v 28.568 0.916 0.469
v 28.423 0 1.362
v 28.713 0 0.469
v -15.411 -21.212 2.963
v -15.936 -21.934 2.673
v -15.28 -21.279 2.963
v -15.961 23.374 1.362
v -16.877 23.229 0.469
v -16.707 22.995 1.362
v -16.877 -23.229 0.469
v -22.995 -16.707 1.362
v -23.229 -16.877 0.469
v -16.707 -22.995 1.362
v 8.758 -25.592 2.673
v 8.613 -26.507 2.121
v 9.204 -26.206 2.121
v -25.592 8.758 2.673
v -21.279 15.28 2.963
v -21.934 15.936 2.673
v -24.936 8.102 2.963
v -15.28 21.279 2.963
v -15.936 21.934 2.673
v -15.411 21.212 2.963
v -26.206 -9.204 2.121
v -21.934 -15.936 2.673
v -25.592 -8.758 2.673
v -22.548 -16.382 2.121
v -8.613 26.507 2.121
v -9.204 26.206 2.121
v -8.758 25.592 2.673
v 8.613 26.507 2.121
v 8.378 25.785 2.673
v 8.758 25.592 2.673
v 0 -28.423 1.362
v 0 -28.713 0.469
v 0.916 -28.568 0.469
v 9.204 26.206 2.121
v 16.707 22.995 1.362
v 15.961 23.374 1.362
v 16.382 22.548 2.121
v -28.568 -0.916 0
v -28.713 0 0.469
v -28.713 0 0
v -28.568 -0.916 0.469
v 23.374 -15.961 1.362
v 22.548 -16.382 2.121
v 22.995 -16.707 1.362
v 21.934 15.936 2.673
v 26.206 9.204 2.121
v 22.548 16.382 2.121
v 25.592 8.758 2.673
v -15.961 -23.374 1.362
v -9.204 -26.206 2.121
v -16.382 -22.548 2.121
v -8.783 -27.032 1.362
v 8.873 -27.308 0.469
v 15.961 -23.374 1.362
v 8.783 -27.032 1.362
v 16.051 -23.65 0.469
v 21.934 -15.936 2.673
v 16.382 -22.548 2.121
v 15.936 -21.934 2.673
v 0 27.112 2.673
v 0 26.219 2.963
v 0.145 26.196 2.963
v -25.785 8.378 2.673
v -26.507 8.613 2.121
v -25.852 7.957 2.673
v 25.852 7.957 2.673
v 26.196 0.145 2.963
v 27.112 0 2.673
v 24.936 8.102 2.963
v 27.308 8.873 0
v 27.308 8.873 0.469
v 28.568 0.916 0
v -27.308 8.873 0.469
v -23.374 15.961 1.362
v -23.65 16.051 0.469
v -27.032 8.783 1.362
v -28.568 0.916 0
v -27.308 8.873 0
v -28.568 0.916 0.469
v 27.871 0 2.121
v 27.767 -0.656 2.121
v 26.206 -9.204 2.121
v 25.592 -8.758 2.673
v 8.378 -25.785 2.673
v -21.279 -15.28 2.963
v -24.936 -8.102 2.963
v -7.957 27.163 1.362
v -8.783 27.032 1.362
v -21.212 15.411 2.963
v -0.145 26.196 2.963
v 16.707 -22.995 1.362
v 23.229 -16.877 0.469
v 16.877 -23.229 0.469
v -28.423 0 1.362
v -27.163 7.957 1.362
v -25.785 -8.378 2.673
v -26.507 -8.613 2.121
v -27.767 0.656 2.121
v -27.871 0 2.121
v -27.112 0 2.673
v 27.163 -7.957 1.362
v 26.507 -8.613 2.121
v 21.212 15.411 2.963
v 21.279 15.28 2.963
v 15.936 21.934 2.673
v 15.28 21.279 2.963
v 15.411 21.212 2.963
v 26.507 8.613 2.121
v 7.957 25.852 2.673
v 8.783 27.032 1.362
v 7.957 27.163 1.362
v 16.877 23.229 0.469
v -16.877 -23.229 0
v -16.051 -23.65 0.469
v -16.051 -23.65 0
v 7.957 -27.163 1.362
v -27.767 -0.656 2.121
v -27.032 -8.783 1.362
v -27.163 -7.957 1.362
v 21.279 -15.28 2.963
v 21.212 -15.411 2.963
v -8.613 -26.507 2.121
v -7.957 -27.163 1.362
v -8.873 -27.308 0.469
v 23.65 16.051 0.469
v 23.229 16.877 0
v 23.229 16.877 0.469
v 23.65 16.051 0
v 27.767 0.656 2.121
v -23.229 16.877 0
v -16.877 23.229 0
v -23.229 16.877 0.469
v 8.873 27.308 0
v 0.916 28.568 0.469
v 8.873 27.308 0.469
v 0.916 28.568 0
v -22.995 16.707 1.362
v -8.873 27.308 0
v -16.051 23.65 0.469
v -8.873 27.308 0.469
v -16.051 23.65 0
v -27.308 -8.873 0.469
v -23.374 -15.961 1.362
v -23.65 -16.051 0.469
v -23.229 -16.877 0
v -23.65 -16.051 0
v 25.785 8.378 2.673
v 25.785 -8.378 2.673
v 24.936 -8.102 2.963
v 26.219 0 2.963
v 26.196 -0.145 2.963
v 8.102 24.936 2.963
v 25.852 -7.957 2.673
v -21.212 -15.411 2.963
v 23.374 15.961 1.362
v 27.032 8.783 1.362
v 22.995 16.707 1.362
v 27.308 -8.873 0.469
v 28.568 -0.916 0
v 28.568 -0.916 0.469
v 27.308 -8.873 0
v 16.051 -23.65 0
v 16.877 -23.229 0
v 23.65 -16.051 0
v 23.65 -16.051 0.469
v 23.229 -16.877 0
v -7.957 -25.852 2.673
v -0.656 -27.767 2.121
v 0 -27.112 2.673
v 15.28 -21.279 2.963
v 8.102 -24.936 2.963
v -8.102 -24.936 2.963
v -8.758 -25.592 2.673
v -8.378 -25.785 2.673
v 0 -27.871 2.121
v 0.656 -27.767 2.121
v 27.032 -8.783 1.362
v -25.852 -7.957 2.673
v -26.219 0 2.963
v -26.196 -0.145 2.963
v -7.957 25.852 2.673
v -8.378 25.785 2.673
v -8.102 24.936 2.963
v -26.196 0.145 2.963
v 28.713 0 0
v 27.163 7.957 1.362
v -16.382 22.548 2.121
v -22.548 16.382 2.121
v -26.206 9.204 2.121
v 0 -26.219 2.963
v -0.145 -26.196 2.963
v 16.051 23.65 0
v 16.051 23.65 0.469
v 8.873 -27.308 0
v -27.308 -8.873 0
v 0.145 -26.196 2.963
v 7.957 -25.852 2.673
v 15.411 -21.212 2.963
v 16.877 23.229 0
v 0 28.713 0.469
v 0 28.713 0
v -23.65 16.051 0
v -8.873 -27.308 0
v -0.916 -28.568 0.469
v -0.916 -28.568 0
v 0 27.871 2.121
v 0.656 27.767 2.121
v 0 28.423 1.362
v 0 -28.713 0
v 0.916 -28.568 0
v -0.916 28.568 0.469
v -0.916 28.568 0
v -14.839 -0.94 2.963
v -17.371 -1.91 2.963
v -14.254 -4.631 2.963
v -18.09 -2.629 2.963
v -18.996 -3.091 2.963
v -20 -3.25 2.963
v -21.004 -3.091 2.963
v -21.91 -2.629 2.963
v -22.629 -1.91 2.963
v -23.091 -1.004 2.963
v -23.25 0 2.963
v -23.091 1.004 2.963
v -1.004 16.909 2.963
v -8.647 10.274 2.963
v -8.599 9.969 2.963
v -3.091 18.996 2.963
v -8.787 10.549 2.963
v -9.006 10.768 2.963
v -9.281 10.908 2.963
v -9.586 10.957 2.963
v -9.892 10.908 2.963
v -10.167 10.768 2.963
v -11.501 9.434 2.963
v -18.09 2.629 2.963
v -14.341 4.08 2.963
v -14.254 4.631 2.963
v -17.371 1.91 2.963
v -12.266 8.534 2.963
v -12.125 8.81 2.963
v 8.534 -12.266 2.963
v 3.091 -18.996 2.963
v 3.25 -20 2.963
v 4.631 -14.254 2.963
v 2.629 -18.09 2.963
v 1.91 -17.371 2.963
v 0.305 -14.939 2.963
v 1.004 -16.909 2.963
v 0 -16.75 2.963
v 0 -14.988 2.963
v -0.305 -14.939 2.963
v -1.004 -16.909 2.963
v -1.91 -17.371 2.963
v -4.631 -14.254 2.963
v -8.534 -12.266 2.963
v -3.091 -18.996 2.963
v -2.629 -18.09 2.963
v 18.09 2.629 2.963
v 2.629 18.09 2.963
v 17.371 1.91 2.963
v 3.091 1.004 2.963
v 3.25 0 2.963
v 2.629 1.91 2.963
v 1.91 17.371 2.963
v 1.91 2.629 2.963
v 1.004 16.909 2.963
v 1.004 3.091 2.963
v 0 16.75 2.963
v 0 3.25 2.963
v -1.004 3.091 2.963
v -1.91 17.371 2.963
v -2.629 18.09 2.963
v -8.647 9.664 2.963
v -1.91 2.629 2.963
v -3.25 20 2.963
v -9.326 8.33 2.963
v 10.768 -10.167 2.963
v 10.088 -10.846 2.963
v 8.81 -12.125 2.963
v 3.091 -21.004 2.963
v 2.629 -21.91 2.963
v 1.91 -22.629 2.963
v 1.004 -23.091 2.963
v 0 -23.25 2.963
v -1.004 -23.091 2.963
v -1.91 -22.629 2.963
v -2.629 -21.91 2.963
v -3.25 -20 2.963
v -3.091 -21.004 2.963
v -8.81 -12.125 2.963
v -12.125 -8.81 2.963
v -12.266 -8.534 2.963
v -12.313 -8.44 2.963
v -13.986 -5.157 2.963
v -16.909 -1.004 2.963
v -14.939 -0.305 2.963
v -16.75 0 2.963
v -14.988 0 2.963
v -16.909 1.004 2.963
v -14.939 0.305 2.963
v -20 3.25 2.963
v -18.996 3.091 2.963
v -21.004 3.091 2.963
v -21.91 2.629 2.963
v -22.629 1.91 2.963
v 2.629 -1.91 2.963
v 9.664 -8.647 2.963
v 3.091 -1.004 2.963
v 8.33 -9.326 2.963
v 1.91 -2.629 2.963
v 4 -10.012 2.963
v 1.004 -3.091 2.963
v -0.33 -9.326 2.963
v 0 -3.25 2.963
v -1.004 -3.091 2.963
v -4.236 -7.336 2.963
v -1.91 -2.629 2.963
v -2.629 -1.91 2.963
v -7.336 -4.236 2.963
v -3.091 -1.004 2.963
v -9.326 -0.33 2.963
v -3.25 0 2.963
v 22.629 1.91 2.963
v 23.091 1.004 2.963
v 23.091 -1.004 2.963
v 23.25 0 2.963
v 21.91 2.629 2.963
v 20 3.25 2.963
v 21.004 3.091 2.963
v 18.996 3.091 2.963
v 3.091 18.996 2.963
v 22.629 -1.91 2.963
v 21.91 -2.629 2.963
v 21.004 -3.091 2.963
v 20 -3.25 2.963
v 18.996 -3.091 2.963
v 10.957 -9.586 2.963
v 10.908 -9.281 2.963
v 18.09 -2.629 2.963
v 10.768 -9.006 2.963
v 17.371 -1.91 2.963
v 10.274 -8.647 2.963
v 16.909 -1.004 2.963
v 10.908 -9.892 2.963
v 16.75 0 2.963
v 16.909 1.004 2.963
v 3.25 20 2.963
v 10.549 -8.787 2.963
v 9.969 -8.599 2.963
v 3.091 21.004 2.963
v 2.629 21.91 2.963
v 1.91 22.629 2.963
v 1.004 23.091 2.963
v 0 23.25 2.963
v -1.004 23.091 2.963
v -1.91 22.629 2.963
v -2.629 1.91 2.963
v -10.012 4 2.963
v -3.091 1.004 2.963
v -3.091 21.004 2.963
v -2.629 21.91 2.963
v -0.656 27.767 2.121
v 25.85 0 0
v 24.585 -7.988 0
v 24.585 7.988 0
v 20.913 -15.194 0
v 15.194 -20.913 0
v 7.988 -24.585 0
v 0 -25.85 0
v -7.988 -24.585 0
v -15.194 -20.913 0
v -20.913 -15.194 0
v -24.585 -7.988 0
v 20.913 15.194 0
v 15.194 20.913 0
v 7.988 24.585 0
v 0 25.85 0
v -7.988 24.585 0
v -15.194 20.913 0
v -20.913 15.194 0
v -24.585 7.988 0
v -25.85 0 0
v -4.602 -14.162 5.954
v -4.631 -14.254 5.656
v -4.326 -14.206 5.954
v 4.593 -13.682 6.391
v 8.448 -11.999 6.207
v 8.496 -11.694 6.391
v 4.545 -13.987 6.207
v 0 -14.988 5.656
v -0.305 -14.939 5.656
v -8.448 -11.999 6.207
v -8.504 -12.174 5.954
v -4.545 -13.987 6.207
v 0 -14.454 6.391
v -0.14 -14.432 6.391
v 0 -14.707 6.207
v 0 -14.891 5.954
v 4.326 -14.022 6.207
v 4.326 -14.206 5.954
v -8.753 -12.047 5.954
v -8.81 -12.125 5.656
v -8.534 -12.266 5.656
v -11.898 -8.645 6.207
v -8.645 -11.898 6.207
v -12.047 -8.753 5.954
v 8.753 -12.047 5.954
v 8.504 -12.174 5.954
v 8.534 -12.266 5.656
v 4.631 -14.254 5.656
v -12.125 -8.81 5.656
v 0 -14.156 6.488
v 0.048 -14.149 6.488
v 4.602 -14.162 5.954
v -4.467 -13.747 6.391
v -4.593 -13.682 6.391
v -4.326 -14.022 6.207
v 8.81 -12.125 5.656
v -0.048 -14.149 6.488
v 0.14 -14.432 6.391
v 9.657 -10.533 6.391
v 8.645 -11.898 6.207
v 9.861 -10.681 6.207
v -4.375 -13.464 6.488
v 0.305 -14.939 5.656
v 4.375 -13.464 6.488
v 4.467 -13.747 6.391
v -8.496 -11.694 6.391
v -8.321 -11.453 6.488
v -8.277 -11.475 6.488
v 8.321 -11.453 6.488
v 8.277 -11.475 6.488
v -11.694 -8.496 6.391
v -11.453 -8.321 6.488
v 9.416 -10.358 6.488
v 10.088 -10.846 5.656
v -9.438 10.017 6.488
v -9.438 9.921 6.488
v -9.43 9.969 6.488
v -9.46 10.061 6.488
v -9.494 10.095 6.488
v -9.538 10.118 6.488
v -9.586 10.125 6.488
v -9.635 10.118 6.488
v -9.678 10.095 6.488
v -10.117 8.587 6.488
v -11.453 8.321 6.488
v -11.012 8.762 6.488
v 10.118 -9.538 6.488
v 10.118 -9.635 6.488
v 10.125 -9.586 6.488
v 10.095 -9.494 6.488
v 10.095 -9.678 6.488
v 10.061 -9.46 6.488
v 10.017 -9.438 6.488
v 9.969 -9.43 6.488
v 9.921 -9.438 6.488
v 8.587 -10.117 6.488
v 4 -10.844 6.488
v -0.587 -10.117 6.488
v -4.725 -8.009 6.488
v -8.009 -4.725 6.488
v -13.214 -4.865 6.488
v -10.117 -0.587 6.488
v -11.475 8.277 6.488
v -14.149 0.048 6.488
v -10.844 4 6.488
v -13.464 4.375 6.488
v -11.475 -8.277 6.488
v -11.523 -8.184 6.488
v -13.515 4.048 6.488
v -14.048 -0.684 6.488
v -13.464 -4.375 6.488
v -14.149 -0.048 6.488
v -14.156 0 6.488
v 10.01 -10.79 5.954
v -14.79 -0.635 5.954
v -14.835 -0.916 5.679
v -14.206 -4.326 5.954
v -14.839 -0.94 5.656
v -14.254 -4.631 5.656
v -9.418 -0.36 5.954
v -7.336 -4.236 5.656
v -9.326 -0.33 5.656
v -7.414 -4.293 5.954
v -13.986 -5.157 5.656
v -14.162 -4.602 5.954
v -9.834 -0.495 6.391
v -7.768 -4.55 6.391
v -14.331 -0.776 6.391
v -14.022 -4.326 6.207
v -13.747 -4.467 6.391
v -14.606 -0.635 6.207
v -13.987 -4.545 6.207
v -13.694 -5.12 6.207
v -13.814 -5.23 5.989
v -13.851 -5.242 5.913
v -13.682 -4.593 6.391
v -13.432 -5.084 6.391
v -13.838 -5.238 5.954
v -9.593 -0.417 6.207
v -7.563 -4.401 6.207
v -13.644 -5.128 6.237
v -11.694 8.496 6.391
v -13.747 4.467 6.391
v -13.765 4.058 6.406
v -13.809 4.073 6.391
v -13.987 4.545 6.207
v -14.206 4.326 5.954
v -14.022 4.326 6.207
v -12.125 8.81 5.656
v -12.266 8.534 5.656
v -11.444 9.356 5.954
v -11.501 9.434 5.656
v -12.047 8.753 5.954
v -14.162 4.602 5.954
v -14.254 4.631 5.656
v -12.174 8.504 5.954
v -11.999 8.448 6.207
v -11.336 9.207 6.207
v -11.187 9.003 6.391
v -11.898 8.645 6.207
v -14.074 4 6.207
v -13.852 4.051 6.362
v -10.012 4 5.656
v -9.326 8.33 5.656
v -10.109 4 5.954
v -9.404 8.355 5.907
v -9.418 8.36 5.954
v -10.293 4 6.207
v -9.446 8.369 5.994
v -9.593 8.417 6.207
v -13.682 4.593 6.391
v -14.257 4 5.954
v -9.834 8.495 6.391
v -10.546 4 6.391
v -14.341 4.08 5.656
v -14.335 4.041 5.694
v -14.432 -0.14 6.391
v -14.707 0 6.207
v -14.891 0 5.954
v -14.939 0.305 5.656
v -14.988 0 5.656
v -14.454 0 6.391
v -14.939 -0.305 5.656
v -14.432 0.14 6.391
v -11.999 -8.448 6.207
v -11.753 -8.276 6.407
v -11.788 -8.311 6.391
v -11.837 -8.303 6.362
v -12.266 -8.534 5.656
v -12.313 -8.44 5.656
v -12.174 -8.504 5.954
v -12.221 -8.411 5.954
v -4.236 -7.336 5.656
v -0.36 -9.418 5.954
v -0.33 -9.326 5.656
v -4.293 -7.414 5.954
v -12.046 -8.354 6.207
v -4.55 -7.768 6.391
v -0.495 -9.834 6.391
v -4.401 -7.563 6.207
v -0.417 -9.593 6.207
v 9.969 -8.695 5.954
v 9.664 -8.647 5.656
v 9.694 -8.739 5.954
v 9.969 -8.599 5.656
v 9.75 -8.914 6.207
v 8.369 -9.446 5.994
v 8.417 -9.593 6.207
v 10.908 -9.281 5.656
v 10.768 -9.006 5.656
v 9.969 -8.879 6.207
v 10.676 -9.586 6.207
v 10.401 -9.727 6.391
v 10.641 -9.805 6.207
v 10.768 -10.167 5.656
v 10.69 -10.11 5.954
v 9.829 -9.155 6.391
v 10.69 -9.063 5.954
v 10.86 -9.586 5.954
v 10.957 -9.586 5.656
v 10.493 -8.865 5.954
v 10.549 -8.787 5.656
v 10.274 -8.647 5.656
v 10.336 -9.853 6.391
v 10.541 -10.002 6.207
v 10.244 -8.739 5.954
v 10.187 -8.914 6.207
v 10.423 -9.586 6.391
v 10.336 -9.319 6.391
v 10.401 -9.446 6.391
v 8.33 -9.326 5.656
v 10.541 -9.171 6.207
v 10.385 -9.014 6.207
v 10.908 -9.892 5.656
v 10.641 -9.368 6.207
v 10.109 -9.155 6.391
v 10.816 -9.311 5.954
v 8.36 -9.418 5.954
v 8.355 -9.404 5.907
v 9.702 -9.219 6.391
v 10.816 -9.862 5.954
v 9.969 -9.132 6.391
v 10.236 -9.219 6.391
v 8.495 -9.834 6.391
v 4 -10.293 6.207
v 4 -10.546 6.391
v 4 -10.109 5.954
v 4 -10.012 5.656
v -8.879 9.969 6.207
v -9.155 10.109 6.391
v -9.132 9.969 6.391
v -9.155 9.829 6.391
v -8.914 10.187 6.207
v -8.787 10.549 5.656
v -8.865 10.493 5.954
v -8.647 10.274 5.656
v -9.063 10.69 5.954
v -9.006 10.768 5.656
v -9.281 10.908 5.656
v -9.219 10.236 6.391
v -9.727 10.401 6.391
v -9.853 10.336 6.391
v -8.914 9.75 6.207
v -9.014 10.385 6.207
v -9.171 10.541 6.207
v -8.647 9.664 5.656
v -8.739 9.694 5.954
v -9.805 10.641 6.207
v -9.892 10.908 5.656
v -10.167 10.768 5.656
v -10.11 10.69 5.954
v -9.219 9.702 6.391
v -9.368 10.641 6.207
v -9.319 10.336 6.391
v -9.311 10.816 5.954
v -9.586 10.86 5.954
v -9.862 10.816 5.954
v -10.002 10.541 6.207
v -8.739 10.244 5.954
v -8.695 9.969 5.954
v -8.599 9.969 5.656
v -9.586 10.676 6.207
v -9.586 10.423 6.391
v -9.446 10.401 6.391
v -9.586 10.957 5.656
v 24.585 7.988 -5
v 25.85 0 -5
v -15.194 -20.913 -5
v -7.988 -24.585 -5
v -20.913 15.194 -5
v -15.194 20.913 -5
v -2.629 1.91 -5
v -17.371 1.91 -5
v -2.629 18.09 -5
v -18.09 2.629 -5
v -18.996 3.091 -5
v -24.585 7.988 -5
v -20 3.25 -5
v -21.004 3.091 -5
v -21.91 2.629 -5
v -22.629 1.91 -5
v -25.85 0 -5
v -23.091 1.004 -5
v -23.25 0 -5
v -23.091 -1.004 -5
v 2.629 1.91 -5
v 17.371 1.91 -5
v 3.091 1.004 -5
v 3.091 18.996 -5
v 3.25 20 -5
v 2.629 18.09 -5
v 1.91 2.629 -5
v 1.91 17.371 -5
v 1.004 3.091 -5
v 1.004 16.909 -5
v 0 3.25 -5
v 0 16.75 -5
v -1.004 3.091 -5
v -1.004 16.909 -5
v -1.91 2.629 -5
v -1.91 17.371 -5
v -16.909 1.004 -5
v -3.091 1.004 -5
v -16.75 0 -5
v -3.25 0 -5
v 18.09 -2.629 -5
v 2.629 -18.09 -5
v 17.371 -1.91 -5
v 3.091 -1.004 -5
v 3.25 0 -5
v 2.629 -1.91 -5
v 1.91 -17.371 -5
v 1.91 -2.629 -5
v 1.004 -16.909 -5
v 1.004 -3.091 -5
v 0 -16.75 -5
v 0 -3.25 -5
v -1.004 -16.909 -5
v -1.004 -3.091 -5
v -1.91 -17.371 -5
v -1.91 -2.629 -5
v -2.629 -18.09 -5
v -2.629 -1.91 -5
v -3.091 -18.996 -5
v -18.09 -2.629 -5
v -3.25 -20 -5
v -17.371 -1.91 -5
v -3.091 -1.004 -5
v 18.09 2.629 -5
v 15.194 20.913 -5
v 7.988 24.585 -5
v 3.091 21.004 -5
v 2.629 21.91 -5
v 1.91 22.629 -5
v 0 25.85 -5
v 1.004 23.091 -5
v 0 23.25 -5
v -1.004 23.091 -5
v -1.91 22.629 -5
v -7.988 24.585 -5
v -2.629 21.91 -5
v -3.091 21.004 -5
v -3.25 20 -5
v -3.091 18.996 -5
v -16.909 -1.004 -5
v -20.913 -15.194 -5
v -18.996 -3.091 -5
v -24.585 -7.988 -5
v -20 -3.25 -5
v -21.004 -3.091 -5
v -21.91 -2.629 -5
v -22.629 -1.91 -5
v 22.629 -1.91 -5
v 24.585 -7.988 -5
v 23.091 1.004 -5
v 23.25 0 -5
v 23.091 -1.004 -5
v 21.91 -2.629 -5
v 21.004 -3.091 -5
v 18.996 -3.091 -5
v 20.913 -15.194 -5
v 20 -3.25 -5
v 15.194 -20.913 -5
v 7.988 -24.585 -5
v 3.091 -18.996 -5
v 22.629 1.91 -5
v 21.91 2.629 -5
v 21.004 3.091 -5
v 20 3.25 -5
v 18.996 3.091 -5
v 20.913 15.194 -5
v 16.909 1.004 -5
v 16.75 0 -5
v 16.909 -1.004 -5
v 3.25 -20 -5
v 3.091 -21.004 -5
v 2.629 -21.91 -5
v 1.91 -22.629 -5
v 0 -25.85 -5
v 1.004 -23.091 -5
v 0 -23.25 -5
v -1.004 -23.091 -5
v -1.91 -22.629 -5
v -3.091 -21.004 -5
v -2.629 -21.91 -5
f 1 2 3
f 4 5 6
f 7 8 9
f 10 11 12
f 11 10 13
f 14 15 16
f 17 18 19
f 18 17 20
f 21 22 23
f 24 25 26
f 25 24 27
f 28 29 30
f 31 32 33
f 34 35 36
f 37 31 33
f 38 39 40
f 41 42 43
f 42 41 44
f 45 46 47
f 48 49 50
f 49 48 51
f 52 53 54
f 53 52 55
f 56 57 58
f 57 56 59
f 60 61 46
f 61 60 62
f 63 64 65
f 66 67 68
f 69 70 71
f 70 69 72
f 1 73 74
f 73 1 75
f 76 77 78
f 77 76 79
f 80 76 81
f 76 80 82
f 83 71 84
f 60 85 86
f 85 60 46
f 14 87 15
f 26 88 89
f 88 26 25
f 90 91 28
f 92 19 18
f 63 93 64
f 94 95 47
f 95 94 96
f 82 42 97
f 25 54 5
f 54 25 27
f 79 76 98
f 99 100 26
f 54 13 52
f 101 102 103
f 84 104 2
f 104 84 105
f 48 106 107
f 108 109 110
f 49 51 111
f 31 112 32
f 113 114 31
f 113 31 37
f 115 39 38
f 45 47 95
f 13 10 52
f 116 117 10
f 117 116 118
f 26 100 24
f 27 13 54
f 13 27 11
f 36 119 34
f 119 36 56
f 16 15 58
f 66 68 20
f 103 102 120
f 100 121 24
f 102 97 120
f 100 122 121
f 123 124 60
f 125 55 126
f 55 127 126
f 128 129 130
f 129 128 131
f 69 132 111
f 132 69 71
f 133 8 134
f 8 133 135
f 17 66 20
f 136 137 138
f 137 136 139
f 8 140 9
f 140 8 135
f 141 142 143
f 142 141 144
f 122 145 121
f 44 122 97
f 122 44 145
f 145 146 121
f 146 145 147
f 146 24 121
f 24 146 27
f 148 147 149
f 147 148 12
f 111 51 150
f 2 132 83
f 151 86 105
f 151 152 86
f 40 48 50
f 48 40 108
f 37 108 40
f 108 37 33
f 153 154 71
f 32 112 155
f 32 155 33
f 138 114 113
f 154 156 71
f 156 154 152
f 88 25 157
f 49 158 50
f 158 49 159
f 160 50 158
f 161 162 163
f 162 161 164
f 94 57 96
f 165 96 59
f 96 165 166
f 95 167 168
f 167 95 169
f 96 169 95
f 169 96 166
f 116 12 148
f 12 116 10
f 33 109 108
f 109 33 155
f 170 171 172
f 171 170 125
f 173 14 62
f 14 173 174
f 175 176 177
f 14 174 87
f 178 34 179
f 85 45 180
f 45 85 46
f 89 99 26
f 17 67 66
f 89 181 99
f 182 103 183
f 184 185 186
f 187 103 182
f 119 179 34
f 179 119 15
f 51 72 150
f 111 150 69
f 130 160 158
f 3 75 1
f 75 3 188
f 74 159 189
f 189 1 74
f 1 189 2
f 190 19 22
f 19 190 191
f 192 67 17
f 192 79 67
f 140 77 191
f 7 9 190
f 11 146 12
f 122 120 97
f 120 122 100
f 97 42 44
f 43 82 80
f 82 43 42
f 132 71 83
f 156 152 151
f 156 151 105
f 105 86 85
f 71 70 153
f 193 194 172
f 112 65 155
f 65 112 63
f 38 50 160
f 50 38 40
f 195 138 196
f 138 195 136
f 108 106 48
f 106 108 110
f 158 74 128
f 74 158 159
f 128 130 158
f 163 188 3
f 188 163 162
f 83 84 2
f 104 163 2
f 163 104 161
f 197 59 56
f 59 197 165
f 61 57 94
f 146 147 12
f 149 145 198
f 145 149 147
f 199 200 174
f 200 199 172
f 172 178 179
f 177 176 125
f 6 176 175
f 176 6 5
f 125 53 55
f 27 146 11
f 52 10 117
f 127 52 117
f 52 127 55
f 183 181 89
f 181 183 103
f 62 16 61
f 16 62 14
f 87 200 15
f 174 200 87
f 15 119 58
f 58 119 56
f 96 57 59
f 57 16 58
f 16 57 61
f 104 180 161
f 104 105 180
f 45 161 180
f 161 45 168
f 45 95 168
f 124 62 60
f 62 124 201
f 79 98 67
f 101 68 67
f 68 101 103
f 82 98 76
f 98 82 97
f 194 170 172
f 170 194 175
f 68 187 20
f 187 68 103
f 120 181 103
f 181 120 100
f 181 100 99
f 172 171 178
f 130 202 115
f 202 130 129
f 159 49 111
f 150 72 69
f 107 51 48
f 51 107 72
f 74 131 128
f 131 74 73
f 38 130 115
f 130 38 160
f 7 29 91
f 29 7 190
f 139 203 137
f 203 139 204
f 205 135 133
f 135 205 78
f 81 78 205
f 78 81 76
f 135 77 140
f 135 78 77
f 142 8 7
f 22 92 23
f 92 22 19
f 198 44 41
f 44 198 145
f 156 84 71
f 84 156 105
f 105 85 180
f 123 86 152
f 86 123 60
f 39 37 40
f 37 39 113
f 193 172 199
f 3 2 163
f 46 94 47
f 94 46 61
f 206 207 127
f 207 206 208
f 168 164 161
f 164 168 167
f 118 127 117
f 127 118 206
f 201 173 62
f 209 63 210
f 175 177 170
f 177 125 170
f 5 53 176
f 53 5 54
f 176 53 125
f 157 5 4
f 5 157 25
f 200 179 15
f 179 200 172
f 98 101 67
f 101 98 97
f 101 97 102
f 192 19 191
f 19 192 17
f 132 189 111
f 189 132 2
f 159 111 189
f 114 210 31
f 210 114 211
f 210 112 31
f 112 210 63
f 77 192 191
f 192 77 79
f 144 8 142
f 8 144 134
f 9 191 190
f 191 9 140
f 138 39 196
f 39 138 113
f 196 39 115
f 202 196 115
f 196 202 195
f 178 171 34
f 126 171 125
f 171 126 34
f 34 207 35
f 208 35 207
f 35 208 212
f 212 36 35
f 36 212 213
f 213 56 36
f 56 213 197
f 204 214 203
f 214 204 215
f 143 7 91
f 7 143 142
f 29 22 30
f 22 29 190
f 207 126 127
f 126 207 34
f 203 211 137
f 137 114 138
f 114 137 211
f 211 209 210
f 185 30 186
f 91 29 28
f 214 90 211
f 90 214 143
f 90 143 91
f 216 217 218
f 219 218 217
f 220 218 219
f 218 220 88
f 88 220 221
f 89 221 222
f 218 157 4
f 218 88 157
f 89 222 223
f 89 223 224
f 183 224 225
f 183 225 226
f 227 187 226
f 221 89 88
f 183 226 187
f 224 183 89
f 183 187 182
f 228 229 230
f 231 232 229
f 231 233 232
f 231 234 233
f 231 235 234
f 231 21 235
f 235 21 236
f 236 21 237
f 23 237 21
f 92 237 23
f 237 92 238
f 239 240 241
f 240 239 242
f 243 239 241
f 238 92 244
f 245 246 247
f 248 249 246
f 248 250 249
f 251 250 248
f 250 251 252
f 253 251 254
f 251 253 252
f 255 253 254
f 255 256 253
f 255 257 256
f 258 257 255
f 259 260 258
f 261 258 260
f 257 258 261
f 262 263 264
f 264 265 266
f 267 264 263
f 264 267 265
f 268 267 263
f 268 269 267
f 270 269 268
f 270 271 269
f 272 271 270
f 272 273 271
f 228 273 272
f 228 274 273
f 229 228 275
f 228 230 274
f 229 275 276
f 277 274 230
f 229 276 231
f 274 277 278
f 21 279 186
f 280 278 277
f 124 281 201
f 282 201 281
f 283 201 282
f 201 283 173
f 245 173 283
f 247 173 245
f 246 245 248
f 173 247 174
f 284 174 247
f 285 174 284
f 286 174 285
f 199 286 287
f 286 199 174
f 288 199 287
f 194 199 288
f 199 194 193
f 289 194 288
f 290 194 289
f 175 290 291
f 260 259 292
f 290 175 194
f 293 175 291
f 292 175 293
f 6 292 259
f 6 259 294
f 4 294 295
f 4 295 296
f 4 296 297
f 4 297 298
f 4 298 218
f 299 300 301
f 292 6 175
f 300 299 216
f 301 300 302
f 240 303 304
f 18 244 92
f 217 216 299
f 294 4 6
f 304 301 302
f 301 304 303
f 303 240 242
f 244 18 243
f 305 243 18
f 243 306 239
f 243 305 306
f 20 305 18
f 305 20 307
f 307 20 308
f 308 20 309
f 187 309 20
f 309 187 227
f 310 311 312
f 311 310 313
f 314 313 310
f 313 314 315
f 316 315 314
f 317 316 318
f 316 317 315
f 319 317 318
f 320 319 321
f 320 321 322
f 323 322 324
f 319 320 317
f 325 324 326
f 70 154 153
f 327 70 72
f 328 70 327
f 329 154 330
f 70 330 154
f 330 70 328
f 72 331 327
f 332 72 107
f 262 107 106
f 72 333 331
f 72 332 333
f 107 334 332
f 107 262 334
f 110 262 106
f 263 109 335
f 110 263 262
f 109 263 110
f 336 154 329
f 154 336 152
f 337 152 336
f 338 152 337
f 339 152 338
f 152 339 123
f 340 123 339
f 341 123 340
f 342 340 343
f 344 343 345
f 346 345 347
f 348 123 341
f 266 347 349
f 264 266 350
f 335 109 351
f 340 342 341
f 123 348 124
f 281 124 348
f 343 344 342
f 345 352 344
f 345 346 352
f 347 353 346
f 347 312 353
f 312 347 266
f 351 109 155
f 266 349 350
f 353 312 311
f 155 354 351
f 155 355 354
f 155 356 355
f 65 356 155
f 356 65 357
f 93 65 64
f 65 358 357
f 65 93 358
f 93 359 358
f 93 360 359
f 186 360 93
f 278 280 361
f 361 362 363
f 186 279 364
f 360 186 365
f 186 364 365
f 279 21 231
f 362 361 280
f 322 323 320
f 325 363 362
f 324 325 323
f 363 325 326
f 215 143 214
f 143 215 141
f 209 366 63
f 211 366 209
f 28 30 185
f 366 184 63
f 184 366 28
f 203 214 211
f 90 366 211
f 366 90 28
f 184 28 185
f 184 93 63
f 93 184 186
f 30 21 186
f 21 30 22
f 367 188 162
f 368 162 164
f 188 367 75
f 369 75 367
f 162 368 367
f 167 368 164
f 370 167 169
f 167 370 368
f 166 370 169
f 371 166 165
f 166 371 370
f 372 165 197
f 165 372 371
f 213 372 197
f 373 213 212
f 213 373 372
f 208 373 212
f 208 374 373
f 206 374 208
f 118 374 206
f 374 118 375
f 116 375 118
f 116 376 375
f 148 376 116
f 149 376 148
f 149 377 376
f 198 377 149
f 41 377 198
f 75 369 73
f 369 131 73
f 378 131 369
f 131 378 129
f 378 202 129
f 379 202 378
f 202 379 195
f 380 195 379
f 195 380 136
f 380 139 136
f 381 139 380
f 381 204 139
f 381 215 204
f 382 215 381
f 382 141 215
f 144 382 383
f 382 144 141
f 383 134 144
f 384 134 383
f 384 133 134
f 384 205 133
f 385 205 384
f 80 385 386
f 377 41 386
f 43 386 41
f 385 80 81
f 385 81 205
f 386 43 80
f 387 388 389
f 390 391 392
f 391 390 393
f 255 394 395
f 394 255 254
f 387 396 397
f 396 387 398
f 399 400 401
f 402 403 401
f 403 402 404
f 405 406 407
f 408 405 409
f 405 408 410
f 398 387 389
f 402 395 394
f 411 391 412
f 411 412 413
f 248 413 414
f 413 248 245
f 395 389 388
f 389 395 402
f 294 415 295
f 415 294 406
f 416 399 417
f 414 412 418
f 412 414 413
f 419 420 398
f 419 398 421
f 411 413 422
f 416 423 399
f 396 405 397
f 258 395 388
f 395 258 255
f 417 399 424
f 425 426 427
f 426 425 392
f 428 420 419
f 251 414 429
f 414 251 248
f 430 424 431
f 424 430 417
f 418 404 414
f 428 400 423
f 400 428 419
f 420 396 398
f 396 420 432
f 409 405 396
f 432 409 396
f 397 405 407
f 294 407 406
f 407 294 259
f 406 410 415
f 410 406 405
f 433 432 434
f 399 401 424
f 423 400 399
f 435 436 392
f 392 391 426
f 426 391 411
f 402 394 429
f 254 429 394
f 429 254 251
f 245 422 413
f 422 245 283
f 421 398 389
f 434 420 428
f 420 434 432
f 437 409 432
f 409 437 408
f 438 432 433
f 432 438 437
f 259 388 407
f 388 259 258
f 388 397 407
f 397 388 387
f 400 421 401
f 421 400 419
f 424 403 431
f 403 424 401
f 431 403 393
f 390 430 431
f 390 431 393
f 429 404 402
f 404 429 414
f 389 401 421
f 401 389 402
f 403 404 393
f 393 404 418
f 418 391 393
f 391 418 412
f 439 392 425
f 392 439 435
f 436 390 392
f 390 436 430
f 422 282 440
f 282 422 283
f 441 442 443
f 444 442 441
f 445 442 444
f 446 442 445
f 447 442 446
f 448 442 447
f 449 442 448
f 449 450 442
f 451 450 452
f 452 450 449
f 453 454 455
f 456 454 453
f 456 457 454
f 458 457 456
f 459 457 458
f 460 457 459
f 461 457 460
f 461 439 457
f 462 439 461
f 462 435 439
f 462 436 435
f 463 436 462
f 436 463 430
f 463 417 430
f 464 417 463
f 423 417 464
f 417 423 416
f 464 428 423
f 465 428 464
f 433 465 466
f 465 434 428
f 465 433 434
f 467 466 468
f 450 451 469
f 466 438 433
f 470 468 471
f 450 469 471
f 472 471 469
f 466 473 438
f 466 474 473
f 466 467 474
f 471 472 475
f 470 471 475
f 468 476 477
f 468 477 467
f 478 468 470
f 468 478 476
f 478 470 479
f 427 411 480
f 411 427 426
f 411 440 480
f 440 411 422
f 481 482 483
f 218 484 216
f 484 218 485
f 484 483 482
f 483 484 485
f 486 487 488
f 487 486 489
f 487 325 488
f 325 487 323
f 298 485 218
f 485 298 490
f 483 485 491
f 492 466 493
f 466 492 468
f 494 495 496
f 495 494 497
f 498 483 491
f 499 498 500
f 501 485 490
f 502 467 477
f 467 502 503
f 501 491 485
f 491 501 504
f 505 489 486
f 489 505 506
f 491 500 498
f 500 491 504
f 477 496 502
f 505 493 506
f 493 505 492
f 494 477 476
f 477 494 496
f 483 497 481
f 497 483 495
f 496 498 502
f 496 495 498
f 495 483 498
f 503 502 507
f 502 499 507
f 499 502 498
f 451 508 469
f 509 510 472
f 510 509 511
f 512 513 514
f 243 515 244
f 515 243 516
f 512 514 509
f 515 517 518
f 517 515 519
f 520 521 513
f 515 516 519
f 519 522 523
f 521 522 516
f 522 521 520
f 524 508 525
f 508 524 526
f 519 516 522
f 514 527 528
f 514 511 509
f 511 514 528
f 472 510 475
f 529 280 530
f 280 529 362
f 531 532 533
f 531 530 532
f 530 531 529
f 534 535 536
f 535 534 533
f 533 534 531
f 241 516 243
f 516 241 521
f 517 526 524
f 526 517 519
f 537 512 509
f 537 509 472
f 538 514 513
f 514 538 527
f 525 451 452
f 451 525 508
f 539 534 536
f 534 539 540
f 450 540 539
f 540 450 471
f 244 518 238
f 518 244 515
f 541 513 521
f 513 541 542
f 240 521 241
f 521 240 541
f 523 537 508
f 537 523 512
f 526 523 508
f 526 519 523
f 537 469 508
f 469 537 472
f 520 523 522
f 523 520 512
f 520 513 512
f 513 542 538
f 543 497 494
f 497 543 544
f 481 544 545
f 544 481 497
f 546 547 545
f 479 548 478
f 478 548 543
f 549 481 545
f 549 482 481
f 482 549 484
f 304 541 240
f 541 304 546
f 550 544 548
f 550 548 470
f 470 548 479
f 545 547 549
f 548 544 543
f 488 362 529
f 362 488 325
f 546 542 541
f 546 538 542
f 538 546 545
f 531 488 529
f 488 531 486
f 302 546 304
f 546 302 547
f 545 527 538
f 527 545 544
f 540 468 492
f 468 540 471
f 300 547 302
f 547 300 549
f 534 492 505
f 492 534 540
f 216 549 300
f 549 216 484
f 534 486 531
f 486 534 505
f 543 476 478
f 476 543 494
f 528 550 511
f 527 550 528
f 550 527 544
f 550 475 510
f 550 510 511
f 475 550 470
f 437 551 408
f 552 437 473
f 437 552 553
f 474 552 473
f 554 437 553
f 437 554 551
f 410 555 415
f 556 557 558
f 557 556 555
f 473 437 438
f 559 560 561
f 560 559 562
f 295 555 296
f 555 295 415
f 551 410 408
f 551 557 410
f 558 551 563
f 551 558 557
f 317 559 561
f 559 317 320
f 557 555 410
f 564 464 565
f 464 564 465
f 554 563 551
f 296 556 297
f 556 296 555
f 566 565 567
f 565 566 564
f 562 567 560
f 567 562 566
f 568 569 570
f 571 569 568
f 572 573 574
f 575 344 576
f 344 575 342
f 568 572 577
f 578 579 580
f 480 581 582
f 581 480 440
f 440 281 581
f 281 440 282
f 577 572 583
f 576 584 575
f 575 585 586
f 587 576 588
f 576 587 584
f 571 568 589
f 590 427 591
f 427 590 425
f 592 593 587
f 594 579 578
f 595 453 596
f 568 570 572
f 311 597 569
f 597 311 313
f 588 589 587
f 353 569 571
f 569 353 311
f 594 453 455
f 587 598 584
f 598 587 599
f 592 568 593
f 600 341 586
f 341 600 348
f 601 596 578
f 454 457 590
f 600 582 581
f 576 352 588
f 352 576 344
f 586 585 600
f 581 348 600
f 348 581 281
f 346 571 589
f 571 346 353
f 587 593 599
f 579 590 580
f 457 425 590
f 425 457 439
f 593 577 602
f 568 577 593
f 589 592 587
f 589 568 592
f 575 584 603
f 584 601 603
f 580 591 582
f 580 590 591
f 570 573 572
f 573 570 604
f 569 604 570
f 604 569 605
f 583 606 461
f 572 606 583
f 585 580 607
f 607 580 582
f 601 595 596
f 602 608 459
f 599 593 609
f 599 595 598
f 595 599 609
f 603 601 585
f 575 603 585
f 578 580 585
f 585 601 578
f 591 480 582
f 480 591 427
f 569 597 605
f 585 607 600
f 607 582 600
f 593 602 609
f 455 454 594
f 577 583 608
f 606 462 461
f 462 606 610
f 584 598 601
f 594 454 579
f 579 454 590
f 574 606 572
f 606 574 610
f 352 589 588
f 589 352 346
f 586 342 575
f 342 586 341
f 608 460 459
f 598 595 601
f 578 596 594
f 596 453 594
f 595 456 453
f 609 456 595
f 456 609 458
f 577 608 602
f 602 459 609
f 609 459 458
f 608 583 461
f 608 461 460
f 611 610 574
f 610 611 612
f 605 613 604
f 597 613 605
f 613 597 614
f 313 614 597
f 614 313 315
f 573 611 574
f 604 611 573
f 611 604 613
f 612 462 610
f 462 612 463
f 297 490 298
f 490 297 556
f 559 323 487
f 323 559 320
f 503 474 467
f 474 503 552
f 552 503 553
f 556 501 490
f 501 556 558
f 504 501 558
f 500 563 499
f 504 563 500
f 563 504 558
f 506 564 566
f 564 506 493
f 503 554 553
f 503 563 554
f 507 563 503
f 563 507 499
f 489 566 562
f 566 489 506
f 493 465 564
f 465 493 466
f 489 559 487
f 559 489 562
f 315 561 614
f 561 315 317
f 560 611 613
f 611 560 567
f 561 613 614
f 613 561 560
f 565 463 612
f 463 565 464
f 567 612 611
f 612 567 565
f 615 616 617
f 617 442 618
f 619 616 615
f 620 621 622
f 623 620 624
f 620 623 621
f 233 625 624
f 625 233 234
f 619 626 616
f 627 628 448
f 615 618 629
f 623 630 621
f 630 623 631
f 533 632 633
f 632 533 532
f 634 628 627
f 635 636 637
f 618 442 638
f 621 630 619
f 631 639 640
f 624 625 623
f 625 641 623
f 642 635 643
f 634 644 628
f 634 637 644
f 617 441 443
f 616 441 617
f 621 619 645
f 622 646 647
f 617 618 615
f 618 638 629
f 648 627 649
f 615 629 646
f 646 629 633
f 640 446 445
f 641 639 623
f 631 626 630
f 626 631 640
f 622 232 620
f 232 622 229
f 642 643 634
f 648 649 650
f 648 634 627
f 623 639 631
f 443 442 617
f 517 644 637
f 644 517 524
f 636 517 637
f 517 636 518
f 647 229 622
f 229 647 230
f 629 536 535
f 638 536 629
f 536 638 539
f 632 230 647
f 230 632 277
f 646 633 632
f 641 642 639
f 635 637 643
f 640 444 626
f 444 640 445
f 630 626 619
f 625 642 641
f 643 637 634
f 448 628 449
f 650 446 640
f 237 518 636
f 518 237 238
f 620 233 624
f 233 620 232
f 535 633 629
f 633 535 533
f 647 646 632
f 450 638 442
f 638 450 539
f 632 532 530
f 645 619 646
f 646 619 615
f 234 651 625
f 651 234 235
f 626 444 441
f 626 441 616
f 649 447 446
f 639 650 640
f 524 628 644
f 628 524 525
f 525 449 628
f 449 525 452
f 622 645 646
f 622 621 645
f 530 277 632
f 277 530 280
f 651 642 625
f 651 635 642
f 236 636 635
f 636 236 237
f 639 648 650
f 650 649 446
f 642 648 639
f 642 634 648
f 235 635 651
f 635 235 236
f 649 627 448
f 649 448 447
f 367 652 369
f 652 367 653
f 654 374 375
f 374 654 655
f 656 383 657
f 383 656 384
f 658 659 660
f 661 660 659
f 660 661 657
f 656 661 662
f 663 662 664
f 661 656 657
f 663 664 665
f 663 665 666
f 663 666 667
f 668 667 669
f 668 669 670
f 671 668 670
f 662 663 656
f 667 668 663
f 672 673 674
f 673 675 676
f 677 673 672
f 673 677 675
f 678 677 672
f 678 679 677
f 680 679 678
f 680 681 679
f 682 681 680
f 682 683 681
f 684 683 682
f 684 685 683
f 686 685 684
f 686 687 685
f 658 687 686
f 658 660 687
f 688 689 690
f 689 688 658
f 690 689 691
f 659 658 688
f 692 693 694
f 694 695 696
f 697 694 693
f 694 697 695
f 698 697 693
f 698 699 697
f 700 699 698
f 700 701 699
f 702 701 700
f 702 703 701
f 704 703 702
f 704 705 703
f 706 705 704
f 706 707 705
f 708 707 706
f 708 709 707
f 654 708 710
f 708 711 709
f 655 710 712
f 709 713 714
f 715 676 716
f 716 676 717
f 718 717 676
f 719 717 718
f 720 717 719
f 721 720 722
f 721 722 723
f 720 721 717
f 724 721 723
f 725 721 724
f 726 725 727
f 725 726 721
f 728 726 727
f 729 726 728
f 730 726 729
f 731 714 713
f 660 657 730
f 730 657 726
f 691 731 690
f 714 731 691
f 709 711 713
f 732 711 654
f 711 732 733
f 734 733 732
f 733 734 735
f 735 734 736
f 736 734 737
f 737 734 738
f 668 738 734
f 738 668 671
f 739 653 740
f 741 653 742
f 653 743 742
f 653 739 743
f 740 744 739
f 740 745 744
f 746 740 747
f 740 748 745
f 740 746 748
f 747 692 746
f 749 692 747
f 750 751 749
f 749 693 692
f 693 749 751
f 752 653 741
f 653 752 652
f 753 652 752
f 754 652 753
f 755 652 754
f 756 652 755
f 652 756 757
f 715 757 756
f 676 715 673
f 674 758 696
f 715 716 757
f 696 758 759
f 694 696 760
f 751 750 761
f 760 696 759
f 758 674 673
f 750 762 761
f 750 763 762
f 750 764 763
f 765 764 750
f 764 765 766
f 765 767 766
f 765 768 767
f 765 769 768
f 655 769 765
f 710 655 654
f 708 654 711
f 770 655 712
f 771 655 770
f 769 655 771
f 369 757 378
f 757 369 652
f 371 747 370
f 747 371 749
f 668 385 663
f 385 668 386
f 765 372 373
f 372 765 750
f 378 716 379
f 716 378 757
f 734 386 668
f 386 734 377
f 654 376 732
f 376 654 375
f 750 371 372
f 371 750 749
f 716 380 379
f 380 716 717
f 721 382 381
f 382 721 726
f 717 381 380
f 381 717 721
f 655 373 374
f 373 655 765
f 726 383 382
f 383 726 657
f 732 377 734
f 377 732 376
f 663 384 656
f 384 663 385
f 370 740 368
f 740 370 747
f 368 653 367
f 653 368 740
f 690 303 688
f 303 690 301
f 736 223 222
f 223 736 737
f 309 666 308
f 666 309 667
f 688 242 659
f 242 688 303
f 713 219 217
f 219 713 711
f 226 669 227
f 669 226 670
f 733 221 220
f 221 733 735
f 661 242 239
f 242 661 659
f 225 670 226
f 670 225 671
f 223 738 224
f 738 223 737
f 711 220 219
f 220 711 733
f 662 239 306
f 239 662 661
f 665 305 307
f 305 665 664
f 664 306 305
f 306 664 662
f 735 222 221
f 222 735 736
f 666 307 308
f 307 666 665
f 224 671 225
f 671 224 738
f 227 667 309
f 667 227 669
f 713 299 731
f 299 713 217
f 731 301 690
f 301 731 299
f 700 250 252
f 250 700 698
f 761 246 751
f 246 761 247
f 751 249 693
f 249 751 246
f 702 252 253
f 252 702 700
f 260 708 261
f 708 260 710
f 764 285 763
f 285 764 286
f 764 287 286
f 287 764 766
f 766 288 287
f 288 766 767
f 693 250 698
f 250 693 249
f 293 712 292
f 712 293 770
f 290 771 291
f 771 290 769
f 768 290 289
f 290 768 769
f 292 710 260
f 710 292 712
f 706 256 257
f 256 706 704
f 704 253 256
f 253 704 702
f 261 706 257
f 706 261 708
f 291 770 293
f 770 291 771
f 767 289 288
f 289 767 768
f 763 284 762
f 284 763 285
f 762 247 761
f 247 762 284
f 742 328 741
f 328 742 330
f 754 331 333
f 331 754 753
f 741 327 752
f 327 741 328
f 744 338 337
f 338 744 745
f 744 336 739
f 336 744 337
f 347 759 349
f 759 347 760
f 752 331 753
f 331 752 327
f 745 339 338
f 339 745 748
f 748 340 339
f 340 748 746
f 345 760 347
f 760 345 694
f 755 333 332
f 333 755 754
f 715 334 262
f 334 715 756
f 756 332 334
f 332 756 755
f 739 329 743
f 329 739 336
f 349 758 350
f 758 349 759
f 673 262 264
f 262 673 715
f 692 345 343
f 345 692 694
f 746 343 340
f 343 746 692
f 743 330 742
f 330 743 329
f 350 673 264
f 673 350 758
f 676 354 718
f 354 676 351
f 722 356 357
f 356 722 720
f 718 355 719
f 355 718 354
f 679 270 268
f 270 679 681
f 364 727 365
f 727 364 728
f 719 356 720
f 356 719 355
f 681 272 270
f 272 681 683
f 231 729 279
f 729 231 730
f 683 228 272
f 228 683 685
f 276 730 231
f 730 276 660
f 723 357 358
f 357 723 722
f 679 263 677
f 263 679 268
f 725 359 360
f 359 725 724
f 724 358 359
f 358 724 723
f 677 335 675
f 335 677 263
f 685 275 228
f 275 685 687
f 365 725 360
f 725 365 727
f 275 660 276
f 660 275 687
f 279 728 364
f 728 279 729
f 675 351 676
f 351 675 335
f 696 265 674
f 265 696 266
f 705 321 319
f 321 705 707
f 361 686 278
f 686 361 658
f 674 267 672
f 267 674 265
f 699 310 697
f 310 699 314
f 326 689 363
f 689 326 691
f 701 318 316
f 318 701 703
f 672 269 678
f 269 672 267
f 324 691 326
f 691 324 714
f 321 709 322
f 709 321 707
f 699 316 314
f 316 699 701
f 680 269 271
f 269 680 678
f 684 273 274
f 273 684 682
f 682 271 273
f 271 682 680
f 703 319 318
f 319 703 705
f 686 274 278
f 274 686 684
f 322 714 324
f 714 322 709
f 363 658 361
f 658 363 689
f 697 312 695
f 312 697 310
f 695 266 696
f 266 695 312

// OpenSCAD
$fn=20;

module round_cylinder( d, h, c ) {
    $true_height = h - (c / 2);
    minkowski() {
        cylinder( d=d-(c * 2), h=$true_height );
        sphere( r=c, h=c );
    }
}

module round_half_cylinder( d, h, c ) {
    $mid_point = (h / 2);
    translate( [0, 0, ($mid_point * -1)] ) {
        difference() {
            round_cylinder( d, h, c );
            translate( [0, 0, (h * -1)] ) {
                cylinder( d=d, h=(h * 1.5) );
            }
        }
    }
}

module moon_shape( d, h, c ) {
    
    minkowski() {
        difference() {
            cylinder( d=(d - (2 * c)), h=(h - (c / 2)) );
            translate( [4, 4, 0] ) {
                cylinder( d=d, h=h );
            }
        }
        sphere( r=c, h=c );
    }
}

module cylinder_slice( r, h, a ) {
  $fn=64;
  intersection() {
    cylinder( r=r, h=h );
    cube( [r, r, h] );
    rotate( a - 90 ) {
        cube( [r, r, h] );
    }
  }
}

module cyilinder_inner( d, a, h, w ) {
    $i_radius = ((d / 2) - (2 * w));
    union() {
        rotate( 85 ) {
            cylinder_slice( h=h, r=$i_radius, a=10 );
        }
        rotate( 205 ) {
            cylinder_slice( h=h, r=$i_radius, a=10 );
        }
        rotate( 325 ) {
            cylinder_slice( h=h, r=$i_radius, a=10 );
        }
    }
}

module broach_legs( d, hi, wi ) {    
    translate( [0, 0, (hi * -1)] ) {
        // Inner Pegs
        difference() {
            cyilinder_inner( d=d, a=5, h=hi, w=2.9 );
            cylinder( r=($r - wi - (2 * 2.5)), h=hi );
        }
        // Bottom Catch Lips
        translate( [0, 0, -2] ) {
            difference() {
                cyilinder_inner( d=d, a=5, h=2, w=2 );
                cylinder( r=($r - wi - (2 * 2.5)), h=2 );
            }
        }
    }
}

module broach_holes( hw=6.5 ) {
    $holes_h = 100;
    union() {
        translate( [-20, 0, (($holes_h / 2) * -1)] ) {
            cylinder( d=hw, h=$holes_h );
        }
        translate( [0, -20, (($holes_h / 2) * -1)] ) {
            cylinder( d=hw, h=$holes_h );
        }
        translate( [20, 0, (($holes_h / 2) * -1)] ) {
            cylinder( d=hw, h=$holes_h );
        }
        translate( [0, 20, (($holes_h / 2) * -1)] ) {
            cylinder( d=hw, h=$holes_h );
        }
        translate( [0, 0, (($holes_h / 2) * -1)] ) {
            cylinder( d=hw, h=$holes_h );
        }
    }
}

module broach( d, h, hi, wi ) {
    $r = d / 2;
    difference() {
        union() {
            round_half_cylinder( d=d, h=h, c=3 );
            translate( [0, 0, h] ) {
                moon_shape( d=30, h=3, c=1 );
            }
            //broach_legs( d, hi, wi );
            translate( [0, 0, -5] ) {
                cylinder( r=($r - wi), h=5 );
            }
        }
        broach_holes();
    }
}

broach( d=57.5, h=3, hi=17.5, wi=2.9 );
